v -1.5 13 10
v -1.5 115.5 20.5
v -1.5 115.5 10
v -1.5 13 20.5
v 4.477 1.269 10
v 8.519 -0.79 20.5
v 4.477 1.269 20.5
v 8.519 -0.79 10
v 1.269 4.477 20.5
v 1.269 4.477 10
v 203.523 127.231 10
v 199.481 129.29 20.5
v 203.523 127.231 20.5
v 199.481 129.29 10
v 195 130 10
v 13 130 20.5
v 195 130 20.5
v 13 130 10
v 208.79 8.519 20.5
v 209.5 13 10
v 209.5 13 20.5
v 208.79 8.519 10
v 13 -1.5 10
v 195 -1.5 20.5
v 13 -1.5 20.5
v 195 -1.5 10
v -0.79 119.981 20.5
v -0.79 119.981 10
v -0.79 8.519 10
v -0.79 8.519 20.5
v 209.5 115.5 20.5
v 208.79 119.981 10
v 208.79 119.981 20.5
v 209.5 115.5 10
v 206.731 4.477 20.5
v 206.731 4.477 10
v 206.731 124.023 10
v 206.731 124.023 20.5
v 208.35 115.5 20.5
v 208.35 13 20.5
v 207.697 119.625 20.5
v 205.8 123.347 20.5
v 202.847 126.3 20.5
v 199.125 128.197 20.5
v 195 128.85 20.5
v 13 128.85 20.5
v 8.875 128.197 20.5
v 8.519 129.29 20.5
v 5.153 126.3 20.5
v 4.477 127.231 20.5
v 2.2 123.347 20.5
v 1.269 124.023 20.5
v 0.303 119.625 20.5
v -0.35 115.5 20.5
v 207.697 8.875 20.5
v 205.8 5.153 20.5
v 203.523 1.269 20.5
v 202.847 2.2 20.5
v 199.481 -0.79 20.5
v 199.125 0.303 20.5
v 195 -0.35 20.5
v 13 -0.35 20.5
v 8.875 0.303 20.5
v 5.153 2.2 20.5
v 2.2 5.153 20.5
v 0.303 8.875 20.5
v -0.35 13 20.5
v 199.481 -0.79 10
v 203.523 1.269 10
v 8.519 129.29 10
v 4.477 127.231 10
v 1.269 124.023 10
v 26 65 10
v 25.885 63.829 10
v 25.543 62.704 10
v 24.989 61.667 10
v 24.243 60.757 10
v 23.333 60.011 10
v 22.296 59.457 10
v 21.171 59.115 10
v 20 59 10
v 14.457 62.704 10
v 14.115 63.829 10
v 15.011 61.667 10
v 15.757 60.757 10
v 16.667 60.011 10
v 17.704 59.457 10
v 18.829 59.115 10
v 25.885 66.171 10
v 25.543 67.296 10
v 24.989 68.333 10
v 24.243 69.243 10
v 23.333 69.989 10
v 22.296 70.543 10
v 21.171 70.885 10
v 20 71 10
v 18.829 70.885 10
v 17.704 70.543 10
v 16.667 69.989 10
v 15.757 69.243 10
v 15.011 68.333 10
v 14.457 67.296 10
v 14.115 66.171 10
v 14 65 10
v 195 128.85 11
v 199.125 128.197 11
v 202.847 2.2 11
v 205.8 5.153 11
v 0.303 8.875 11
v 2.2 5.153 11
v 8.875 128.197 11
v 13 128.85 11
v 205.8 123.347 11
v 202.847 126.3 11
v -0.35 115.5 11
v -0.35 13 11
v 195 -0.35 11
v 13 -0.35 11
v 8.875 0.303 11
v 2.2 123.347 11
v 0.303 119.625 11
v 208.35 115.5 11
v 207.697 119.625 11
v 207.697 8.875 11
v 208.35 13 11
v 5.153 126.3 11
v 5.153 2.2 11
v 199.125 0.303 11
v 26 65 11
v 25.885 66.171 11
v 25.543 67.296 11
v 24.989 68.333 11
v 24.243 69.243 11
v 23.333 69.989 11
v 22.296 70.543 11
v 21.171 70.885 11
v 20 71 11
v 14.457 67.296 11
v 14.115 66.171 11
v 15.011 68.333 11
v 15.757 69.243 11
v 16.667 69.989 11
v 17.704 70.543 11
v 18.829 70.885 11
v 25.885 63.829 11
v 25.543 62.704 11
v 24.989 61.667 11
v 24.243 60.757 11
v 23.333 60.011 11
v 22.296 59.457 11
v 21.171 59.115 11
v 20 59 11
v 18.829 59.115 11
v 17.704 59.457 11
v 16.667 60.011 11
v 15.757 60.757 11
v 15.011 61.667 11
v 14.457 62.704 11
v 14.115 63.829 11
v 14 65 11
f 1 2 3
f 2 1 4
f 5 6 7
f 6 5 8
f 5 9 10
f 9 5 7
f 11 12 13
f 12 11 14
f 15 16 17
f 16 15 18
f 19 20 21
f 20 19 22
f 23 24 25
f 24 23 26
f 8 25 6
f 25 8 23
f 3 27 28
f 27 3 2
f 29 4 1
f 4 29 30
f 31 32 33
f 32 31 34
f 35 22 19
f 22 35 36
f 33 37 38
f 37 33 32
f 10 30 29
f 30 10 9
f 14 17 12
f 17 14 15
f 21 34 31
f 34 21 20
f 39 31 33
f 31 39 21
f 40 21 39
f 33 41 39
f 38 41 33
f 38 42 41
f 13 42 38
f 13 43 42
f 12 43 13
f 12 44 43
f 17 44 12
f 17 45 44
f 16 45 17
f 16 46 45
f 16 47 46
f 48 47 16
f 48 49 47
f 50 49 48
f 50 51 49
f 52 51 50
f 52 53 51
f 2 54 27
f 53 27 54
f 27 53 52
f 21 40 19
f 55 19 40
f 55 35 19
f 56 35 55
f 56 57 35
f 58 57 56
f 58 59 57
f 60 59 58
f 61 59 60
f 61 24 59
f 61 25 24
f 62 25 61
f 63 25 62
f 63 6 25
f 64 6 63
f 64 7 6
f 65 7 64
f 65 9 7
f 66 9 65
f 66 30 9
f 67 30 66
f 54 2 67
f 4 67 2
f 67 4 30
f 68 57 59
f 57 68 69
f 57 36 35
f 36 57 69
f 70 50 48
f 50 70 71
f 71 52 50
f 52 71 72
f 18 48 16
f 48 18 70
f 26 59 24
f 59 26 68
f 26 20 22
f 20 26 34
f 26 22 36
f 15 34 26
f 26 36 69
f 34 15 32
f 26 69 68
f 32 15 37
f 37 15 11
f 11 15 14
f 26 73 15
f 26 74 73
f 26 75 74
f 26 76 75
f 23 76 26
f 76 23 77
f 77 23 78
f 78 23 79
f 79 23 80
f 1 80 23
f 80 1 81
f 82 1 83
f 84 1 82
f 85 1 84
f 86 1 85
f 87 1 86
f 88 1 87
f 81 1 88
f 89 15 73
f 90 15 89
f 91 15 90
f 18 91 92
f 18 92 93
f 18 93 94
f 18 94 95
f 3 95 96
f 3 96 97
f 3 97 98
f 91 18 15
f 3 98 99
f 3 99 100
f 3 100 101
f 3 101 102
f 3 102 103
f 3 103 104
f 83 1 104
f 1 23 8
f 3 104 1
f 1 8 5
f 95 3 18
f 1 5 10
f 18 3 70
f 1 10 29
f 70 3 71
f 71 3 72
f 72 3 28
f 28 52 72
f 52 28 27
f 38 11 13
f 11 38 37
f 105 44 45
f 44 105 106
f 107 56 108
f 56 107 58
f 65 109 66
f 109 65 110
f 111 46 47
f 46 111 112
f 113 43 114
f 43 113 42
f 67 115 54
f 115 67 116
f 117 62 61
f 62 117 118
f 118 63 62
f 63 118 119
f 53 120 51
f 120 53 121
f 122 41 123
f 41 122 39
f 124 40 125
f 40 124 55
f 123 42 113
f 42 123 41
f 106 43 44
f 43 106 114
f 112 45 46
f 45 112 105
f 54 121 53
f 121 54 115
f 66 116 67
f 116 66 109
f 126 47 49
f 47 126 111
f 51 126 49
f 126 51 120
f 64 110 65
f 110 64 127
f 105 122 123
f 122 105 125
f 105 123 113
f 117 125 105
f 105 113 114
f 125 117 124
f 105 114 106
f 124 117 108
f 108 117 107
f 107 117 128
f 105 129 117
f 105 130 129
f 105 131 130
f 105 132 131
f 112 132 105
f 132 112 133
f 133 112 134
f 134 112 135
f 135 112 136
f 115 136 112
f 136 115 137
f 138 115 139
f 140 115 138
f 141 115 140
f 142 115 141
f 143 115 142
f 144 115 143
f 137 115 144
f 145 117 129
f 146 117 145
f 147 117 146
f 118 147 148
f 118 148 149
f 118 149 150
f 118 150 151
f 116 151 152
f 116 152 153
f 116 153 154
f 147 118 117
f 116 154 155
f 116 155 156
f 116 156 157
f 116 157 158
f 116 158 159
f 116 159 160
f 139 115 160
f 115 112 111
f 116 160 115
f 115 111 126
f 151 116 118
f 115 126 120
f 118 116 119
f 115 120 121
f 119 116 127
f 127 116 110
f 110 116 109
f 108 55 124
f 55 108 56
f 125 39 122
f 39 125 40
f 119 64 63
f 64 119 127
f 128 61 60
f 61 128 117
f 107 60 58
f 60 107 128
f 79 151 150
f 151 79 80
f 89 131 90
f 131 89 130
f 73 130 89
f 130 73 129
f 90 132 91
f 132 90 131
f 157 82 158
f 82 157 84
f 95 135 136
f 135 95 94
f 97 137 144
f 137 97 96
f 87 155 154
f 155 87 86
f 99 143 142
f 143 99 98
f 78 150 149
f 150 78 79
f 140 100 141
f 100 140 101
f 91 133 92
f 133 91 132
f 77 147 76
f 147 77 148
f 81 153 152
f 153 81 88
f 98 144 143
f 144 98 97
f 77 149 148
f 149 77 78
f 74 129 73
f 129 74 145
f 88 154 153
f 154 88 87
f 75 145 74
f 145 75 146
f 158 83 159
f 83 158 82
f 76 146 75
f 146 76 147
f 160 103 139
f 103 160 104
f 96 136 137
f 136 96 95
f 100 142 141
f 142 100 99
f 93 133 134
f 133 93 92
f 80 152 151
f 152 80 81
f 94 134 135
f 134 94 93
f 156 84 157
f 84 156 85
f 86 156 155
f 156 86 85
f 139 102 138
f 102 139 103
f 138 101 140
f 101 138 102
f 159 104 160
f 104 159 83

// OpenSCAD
caseWidth = 128.5;
caseLength = 208;
caseRadius = 13;
caseHeight = 5.5;
caseScreenBorder = 2;
caseScreenRadius = caseRadius - caseScreenBorder;
caseScreenHeight = 1.5;
caseIntRectWidth = 120;
caseIntRectLength = 183;
/*
difference(){
    translate([0,0,0]){
        rad = caseRadius;
        width = caseWidth;
        length = caseLength;
        height = caseHeight;
        hull() {
        for (t =  [[rad,rad,0],[length-rad,rad,0],[length-rad,width-rad,0],[rad,width-rad,0]])
            translate(t) {
                cylinder(r=rad, h=height, $fn=20);
            }
        }
    }
    translate([caseScreenBorder,caseScreenBorder,0]){
        rad = caseScreenRadius;
        width = caseWidth-2*caseScreenBorder;
        length = caseLength-2*caseScreenBorder;
        height = caseScreenHeight;
        hull() {
        for (t =  [[rad,rad,0],[length-rad,rad,0],[length-rad,width-rad,0],[rad,width-rad,0]])
            translate(t) {
                cylinder(r=rad, h=height, $fn=20);
            }
        }
    }

    translate([0,1.5,0]) {
        translate([14,5,0]){
            cube([caseIntRectLength,caseIntRectWidth,caseHeight]);
        }
        translate([5.5,59.5,0]){
            cube([8,8,caseHeight]);
        }
    //    translate([6+7/2,60.5+7/2]){
    //        cylinder(d=7, h=caseHeight);
    //    }
        translate([2.5,63.5,caseHeight-2.5]){
            cylinder(d=5, h=2.5, $fn=32);
        }
        translate([0,63,caseHeight-2.5]){
            cube([2,1,2.5]);
        }
        translate([6.5,86,0]){
            cube([4,26,caseHeight]);
        }
        
        for (t = [[9,14.5,caseHeight-2.5],[6,45.5,caseHeight-2.5],[6,57,caseHeight-2.5],[6,69.75,caseHeight-2.5],[9,82.5,caseHeight-2.5],[12,113.75,caseHeight-2.5],[31,4,caseHeight-2.5],[caseLength-6,36,caseHeight-2.5],[caseLength-6,91,caseHeight-2.5]]) {
            translate(t){
                cylinder(d=1.5, h=2.5, $fn=20);
            }
        }

        translate([0,28,caseHeight-2]){
            cube([15,16,2]);
        }
        
        translate([0,46.75,caseHeight-3]){
            cube([8,9,3]);
        }
        
        translate([0,71,caseHeight-3]){
            cube([15,8,3]);
        }
        translate([7,70,caseHeight-3]){
            cube([3,10,3]);
        }

        translate([0,86,caseHeight-3]){
            cube([10,8,3]);
        }

        translate([18,-1.5,caseHeight-3]){
            cube([8,7,3]);
        }
        translate([36,-1.5,caseHeight-3]){
            cube([8,7,3]);
        }
    }
}
*/

dd = 0.7;

translate([0,0,10])
difference(){
    translate([-1.5,-1.5,0]){
        rad = caseRadius+1.5;
        width = caseWidth+3;
        length = caseLength+3;
        height = caseHeight+5;
        hull() {
        for (t =  [[rad,rad,0],[length-rad,rad,0],[length-rad,width-rad,0],[rad,width-rad,0]])
            translate(t) {
                cylinder(r=rad, h=height, $fn=20);
            }
        }
    }

    translate([-dd/2,-dd/2,1]){
        rad = caseRadius+dd/2;
        width = caseWidth+dd;
        length = caseLength+dd;
        height = caseHeight+5;
        hull() {
        for (t =  [[rad,rad,0],[length-rad,rad,0],[length-rad,width-rad,0],[rad,width-rad,0]])
            translate(t) {
                cylinder(r=rad, h=height, $fn=20);
            }
        }
    }
    
    translate([20,65,0])
        rotate([0,0,0])
            cylinder(d=12, h=10, $fn=32, center=true);
/*    
    translate([2,2,0]){
        rad = caseRadius-2;
        width = caseWidth-4;
        length = caseLength-4;
        height = caseHeight;
        hull() {
        for (t =  [[rad,rad,0],[length-rad,rad,0],[length-rad,width-rad,0],[rad,width-rad,0]])
            translate(t) {
                cylinder(r=rad, h=height, $fn=20);
            }
        }
    }
    */
}
